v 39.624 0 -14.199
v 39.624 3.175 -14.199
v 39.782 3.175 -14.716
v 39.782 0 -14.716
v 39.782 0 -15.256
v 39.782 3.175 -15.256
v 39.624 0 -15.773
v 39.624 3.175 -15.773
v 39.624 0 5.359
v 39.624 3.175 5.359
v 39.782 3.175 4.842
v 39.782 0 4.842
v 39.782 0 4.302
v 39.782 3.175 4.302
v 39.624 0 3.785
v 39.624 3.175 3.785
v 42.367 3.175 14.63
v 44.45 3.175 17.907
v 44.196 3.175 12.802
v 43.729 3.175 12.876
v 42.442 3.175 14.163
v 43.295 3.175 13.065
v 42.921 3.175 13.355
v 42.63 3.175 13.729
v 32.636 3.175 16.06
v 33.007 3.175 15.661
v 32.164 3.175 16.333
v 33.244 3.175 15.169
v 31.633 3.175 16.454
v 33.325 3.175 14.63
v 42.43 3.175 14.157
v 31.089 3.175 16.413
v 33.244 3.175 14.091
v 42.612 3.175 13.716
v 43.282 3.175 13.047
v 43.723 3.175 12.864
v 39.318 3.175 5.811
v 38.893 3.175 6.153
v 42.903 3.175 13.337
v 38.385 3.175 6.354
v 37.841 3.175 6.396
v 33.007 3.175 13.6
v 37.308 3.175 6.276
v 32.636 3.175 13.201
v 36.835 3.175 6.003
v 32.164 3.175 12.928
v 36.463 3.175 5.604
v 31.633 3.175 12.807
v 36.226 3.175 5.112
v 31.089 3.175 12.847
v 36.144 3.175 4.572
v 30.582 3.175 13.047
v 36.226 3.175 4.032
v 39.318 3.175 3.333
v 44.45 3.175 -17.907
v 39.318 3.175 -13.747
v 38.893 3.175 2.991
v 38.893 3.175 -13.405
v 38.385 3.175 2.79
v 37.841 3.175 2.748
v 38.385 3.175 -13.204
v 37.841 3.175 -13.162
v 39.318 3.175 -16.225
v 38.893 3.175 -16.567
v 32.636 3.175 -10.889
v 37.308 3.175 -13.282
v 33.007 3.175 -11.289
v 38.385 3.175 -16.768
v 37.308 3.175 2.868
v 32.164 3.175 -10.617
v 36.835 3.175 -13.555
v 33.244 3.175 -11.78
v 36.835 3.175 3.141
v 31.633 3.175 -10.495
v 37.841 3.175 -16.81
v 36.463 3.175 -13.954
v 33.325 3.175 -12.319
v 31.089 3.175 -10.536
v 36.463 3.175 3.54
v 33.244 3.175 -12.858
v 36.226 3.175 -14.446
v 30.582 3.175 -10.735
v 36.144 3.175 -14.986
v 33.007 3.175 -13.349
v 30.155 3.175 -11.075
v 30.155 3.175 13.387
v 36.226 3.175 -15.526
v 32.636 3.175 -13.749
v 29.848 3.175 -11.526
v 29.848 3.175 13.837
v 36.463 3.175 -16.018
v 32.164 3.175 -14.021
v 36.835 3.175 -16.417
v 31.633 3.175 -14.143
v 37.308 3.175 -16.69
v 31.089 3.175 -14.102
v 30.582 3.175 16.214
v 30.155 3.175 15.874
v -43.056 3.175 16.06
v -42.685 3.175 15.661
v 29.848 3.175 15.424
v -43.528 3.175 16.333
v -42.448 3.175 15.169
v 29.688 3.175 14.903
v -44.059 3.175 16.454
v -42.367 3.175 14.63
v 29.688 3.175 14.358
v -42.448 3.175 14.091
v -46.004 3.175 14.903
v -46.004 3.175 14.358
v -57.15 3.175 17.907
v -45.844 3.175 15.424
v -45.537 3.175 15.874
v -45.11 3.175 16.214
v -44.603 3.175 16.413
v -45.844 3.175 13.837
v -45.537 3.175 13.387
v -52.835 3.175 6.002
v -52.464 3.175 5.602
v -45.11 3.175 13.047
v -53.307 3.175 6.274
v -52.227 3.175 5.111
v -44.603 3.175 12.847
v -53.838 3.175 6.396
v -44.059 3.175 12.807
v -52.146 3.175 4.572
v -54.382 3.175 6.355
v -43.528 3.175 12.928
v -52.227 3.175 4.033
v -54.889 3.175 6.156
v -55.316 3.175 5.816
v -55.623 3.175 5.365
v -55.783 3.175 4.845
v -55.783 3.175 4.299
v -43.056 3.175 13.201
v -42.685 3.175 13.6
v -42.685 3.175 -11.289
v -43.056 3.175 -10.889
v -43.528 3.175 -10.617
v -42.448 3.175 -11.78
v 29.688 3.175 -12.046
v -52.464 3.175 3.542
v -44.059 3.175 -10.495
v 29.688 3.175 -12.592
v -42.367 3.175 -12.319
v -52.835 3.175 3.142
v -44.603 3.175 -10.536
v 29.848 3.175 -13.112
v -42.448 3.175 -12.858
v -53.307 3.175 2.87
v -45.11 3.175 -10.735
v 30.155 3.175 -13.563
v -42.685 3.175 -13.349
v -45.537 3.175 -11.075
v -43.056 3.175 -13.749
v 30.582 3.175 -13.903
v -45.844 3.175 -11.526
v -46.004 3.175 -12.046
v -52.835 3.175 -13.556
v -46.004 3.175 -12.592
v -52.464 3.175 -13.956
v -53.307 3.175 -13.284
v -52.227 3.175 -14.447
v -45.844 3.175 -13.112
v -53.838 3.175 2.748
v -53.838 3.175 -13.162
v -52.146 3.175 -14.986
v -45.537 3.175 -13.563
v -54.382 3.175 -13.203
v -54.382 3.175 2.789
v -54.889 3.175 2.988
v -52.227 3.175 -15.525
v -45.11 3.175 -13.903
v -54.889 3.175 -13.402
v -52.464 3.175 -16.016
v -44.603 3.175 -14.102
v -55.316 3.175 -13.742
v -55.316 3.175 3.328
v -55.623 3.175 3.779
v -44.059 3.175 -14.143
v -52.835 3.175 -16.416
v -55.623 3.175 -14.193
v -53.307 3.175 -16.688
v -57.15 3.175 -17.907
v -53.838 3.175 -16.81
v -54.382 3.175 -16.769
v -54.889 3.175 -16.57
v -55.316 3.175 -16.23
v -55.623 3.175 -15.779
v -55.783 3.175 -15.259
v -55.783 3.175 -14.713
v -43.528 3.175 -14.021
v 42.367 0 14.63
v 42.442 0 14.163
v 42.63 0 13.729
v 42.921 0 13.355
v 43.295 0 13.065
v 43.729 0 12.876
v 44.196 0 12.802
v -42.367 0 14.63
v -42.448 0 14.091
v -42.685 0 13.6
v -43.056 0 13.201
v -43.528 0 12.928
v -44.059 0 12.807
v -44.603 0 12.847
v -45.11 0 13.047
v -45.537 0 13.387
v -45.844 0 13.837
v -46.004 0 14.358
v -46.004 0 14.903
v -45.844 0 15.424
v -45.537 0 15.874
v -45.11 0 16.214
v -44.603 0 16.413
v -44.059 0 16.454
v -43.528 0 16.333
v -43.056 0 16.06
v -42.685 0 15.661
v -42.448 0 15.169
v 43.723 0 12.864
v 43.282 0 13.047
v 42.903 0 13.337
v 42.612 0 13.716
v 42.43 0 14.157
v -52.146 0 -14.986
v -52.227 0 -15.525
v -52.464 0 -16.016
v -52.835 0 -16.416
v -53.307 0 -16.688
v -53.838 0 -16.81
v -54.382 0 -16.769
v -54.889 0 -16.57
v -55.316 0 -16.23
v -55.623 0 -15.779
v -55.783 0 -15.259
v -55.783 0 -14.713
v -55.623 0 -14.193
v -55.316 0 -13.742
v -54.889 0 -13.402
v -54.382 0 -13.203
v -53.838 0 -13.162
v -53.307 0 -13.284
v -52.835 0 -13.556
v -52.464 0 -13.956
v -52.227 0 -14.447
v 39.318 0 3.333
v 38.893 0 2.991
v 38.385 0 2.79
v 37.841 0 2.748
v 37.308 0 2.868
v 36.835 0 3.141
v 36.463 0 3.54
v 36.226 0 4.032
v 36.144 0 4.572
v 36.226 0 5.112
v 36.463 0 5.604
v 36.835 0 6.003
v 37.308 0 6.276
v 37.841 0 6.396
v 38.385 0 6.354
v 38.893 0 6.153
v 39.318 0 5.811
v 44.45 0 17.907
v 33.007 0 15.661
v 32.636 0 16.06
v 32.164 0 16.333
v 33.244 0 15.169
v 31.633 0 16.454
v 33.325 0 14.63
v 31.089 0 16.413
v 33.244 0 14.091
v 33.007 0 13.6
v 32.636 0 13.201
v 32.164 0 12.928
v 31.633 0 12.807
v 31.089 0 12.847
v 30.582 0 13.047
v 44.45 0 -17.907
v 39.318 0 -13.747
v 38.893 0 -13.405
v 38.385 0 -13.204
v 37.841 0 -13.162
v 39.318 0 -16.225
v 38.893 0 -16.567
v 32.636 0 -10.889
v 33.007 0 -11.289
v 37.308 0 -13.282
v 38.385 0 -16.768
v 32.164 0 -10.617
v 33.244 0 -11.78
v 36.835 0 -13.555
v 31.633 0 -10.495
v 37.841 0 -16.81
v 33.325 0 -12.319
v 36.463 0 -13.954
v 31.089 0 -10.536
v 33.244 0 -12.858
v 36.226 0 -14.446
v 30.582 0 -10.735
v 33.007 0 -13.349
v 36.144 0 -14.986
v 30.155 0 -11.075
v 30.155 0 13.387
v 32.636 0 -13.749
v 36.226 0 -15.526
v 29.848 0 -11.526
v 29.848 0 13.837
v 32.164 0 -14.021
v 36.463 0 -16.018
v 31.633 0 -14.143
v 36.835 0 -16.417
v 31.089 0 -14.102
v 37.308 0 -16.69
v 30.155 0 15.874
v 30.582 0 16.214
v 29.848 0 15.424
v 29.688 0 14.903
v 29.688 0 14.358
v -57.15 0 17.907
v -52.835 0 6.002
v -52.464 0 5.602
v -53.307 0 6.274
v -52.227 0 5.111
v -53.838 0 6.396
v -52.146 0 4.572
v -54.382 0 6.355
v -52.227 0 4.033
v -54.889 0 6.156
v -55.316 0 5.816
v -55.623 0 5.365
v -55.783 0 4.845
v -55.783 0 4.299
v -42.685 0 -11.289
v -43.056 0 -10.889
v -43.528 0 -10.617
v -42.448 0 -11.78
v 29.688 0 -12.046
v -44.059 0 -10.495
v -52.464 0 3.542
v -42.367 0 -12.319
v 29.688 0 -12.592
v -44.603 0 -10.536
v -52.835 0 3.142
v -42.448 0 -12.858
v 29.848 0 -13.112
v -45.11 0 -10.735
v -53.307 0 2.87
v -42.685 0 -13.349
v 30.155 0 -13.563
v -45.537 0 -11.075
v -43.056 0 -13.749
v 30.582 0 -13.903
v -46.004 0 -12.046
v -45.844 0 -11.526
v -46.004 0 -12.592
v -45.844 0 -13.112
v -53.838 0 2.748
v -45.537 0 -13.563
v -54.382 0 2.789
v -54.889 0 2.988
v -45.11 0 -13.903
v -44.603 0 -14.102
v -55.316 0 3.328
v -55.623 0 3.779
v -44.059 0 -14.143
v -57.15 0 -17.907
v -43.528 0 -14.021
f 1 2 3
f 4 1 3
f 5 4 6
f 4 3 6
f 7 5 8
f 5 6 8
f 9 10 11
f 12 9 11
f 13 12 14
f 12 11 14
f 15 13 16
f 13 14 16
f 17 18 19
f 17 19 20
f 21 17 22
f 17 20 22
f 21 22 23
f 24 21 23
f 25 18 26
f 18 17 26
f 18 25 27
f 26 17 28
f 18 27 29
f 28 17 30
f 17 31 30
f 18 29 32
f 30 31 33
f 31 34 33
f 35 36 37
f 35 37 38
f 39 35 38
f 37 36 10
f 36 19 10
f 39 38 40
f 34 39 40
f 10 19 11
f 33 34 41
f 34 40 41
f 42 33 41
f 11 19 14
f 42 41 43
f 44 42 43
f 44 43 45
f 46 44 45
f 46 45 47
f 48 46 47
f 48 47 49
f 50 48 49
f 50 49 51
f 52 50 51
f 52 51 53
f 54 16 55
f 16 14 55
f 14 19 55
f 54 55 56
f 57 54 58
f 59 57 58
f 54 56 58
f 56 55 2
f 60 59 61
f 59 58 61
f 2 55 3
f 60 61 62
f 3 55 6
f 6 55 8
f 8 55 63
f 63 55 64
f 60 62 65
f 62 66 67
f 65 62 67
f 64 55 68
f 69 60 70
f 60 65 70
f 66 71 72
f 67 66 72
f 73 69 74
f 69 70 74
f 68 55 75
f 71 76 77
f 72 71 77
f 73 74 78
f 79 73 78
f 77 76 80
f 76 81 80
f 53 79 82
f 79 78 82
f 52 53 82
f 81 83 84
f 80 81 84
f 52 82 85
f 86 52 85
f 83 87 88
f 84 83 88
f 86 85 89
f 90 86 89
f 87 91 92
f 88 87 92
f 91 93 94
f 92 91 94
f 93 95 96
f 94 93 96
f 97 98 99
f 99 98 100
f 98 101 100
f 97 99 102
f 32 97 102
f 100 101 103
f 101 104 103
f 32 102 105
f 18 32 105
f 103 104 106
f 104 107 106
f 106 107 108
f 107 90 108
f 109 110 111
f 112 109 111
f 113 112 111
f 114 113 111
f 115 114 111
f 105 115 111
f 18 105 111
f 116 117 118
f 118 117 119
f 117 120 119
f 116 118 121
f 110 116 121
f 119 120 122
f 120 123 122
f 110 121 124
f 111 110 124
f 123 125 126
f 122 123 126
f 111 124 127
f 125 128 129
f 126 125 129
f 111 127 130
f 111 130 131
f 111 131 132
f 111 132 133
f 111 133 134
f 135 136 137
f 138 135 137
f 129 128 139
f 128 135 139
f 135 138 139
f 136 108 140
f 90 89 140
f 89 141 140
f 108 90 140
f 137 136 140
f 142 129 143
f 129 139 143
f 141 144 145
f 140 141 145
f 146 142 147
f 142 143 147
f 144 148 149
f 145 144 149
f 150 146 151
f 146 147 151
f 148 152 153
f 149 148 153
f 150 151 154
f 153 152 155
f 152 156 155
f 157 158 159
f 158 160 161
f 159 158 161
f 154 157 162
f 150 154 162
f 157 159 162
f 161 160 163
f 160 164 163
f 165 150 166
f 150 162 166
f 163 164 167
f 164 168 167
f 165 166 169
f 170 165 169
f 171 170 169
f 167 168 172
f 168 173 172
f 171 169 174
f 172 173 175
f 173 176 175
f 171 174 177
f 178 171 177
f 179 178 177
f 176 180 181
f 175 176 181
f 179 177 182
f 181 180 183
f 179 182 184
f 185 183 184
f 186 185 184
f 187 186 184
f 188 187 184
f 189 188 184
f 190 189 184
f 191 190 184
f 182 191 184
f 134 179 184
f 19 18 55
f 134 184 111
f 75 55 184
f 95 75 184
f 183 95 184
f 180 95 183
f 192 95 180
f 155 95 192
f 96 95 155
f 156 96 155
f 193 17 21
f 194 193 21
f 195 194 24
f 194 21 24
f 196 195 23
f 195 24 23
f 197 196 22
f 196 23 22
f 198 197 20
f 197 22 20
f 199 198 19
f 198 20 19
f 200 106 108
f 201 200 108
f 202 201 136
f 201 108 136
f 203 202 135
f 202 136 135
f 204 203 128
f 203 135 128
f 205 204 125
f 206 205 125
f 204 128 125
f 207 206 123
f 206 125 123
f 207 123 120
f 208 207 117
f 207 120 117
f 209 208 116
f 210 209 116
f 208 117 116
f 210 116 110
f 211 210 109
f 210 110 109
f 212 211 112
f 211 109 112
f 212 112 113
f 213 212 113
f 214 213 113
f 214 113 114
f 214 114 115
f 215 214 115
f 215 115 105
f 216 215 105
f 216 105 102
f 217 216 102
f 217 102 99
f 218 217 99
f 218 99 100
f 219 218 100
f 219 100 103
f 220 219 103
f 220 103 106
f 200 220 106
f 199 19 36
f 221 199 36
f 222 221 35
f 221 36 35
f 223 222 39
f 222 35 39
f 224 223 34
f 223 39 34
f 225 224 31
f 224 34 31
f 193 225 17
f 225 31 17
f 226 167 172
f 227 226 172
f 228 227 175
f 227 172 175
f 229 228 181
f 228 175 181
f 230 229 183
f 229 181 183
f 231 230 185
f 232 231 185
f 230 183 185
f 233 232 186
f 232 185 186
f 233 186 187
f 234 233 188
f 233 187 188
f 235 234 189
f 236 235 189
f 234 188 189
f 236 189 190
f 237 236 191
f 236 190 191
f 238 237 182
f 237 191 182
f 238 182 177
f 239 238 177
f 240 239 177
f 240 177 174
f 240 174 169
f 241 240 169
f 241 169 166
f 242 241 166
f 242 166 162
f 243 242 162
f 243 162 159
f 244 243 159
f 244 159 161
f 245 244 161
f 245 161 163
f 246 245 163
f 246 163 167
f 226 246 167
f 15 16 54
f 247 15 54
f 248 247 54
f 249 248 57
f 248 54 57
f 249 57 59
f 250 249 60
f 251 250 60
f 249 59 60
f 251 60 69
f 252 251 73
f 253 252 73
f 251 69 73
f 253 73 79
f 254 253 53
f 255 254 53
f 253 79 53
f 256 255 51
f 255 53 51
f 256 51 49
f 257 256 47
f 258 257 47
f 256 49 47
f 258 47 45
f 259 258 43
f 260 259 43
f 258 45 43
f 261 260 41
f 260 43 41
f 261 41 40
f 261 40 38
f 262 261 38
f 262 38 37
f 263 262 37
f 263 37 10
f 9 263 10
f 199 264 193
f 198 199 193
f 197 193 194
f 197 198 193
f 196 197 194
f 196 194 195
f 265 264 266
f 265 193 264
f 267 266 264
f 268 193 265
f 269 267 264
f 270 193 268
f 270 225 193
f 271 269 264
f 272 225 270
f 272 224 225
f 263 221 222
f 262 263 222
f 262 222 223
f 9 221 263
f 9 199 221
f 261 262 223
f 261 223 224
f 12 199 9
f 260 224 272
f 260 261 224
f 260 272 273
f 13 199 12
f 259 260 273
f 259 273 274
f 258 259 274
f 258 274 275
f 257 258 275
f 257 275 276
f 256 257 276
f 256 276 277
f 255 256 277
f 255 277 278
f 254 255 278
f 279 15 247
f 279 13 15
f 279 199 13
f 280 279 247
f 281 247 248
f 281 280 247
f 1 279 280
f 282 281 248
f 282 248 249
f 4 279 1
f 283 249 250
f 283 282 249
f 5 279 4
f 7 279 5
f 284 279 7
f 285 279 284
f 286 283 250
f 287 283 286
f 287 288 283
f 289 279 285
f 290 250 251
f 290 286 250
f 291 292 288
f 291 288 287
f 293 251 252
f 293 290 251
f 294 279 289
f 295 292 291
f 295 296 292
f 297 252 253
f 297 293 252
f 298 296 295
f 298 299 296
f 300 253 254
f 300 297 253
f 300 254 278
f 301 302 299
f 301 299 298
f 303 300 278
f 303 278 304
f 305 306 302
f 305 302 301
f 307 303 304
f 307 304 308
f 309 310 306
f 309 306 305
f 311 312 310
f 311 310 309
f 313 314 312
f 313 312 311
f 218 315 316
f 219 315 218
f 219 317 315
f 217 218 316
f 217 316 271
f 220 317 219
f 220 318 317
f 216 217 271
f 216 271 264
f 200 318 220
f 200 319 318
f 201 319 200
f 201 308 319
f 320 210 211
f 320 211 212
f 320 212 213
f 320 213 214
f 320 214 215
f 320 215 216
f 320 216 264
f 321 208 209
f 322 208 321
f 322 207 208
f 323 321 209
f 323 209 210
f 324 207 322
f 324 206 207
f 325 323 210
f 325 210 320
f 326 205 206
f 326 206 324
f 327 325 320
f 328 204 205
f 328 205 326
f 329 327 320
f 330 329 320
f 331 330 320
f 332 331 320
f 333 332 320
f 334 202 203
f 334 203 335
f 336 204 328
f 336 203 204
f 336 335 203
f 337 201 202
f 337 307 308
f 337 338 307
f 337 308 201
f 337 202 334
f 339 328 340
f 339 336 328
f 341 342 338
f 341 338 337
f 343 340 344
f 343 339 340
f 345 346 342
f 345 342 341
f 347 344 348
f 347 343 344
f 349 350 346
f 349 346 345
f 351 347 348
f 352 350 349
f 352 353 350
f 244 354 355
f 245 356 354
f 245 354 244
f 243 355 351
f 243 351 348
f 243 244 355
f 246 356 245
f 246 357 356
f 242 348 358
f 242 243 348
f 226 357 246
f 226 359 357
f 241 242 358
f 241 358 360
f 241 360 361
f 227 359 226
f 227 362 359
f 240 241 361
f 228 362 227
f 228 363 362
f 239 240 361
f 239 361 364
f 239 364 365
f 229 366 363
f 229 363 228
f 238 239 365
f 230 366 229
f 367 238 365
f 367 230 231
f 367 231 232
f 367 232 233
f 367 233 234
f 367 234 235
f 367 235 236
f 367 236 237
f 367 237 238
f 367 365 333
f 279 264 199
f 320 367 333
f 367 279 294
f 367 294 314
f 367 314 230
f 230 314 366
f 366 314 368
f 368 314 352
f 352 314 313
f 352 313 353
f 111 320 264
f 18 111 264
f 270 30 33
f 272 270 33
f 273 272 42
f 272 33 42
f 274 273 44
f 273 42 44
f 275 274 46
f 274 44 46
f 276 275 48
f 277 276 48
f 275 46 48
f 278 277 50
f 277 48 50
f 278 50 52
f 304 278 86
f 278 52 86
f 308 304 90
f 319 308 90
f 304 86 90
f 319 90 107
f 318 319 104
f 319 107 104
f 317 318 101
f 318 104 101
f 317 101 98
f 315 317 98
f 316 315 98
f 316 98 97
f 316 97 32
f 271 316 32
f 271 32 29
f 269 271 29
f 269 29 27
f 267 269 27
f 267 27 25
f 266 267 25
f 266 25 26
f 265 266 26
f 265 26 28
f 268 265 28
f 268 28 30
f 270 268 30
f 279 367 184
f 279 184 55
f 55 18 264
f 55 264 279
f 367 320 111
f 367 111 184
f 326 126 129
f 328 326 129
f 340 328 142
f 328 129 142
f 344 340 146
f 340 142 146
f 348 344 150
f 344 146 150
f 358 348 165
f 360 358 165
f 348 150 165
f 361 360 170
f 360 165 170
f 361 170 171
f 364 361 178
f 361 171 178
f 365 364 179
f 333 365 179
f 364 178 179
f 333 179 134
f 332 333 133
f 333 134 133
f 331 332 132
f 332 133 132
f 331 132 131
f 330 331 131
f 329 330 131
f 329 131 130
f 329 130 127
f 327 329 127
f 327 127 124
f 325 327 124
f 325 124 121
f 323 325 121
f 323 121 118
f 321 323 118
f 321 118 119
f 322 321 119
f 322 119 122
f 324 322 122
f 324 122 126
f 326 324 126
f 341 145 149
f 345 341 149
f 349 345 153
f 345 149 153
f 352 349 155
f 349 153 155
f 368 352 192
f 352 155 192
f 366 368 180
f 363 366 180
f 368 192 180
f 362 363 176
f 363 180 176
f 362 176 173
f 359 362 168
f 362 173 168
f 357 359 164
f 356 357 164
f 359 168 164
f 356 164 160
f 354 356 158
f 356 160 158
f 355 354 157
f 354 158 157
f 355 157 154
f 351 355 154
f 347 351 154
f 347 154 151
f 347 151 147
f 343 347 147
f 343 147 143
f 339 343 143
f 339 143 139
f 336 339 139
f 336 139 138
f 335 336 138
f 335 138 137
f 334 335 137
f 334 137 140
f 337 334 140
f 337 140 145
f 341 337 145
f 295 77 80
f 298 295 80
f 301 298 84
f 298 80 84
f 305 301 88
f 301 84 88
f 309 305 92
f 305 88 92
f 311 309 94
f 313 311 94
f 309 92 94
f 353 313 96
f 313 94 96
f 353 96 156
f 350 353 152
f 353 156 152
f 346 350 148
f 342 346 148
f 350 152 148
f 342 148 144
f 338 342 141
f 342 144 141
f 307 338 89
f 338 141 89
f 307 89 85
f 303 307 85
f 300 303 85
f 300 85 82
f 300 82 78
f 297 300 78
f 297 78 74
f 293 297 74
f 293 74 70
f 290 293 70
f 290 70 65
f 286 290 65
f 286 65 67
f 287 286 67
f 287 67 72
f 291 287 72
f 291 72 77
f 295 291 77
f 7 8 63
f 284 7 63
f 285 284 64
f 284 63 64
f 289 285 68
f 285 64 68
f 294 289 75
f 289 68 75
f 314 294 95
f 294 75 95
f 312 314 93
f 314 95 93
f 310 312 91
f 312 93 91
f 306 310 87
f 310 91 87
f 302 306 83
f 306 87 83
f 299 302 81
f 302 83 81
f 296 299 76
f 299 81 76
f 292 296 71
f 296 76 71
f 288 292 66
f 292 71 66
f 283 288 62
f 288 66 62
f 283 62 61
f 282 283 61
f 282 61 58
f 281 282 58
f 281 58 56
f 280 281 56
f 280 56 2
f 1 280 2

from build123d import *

# Parameters (mm, degrees)
SKETCH1_W           = 114.3
SKETCH1_H           = 35.814
BOSS_EXTRUDE1_DEPTH = 3.175
SKETCH3_R           = 1.8288
CUT_EXTRUDE2_DEPTH  = 4.175
SKETCH4_W           = 12.7
SKETCH4_H           = 35.814
CUT_EXTRUDE3_DEPTH  = 4.175
SKETCH5_R           = 1.8288
CUT_EXTRUDE4_DEPTH  = 4.175
BOSS_EXTRUDE4_DEPTH = 3.175
SKETCH9_R           = 1.8288
CUT_EXTRUDE5_DEPTH  = 4.175
BOSS_EXTRUDE5_DEPTH = 3.175


with BuildPart() as part:
    # Sketch1 → Boss-Extrude1 (new body)
    with BuildSketch(Plane(origin=(0, 0, 0), x_dir=(1, 0, 0), z_dir=(0, 1, 0))):
        Rectangle(SKETCH1_W, SKETCH1_H)
    extrude(amount=BOSS_EXTRUDE1_DEPTH)

    # Sketch3 → Cut-Extrude2 (cut, through all)
    with BuildSketch(Plane(origin=(0, 3.175, 0), x_dir=(1, 0, 0), z_dir=(0, 1, 0))):
        with Locations((-53.975, 14.986)):
            Circle(SKETCH3_R)
        with Locations((-53.975, -4.572)):
            Circle(SKETCH3_R)
        with Locations((-44.196, 12.319)):
            Circle(SKETCH3_R)
        with Locations((-44.196, -14.6304)):
            Circle(SKETCH3_R)
        with Locations((44.196, -14.6304)):
            Circle(SKETCH3_R)
        with Locations((53.975, -4.572)):
            Circle(SKETCH3_R)
        with Locations((44.196, 12.319)):
            Circle(SKETCH3_R)
        with Locations((53.975, 14.986)):
            Circle(SKETCH3_R)
    extrude(amount=-CUT_EXTRUDE2_DEPTH, mode=Mode.SUBTRACT)

    # Sketch4 → Cut-Extrude3 (cut, through all)
    with BuildSketch(Plane(origin=(0, 3.175, 0), x_dir=(1, 0, 0), z_dir=(0, 1, 0))):
        with Locations((50.8, 0)):
            Rectangle(SKETCH4_W, SKETCH4_H)
    extrude(amount=-CUT_EXTRUDE3_DEPTH, mode=Mode.SUBTRACT)

    # Sketch5 → Cut-Extrude4 (cut, through all)
    with BuildSketch(Plane(origin=(0, 3.175, 0), x_dir=(1, 0, 0), z_dir=(0, 1, 0))):
        with Locations((-44.196, 12.319)):
            Circle(SKETCH5_R)
        with Locations((-53.975, 14.986)):
            Circle(SKETCH5_R)
        with Locations((-53.975, -4.572)):
            Circle(SKETCH5_R)
        with Locations((-44.196, -14.6304)):
            Circle(SKETCH5_R)
        with Locations((31.496, -14.6304)):
            Circle(SKETCH5_R)
        with Locations((41.275, -4.572)):
            Circle(SKETCH5_R)
        with Locations((31.496, 12.319)):
            Circle(SKETCH5_R)
        with Locations((41.275, 14.986)):
            Circle(SKETCH5_R)
    extrude(amount=-CUT_EXTRUDE4_DEPTH, mode=Mode.SUBTRACT)

    # Sketch8 → Boss-Extrude4 (add)
    with BuildSketch(Plane(origin=(0, 3.175, 0), x_dir=(1, 0, 0), z_dir=(0, 1, 0))):
        with BuildLine():
            Line((44.196, 14.1478), (44.45, 14.542460619))
            Line((44.45, 14.542460619), (44.45, 10.507924783))
            ThreePointArc((44.45, 10.507924783), (42.371636577, 12.191691155), (44.196, 14.1478))
        make_face()
        with BuildLine():
            Line((44.196, -12.8016), (44.45, -12.55116419))
            Line((44.45, -12.55116419), (44.45, -16.7132))
            Line((44.45, -16.7132), (44.323, -16.5862))
            ThreePointArc((44.323, -16.5862), (42.3672, -14.7574), (44.196, -12.8016))
        make_face()
    extrude(amount=-BOSS_EXTRUDE4_DEPTH)

    # Sketch9 → Cut-Extrude5 (cut, through all)
    with BuildSketch(Plane(origin=(0, 3.175, 0), x_dir=(1, 0, 0), z_dir=(0, 1, 0))):
        with Locations((37.973, -4.572)):
            Circle(SKETCH9_R)
        with Locations((37.973, 14.986)):
            Circle(SKETCH9_R)
    extrude(amount=-CUT_EXTRUDE5_DEPTH, mode=Mode.SUBTRACT)

    # Sketch10 → Boss-Extrude5 (add)
    with BuildSketch(Plane(origin=(0, 3.175, 0), x_dir=(1, 0, 0), z_dir=(0, 1, 0))):
        with BuildLine():
            ThreePointArc((39.624, 14.199419782), (39.8018, 14.986), (39.624, 15.772580218))
            ThreePointArc((39.624, 15.772580218), (43.1038, 14.986), (39.624, 14.199419782))
        make_face()
        with BuildLine():
            ThreePointArc((39.624, -5.358580218), (39.8018, -4.572), (39.624, -3.785419782))
            ThreePointArc((39.624, -3.785419782), (43.1038, -4.572), (39.624, -5.358580218))
        make_face()
    extrude(amount=-BOSS_EXTRUDE5_DEPTH)


solid = part.part
